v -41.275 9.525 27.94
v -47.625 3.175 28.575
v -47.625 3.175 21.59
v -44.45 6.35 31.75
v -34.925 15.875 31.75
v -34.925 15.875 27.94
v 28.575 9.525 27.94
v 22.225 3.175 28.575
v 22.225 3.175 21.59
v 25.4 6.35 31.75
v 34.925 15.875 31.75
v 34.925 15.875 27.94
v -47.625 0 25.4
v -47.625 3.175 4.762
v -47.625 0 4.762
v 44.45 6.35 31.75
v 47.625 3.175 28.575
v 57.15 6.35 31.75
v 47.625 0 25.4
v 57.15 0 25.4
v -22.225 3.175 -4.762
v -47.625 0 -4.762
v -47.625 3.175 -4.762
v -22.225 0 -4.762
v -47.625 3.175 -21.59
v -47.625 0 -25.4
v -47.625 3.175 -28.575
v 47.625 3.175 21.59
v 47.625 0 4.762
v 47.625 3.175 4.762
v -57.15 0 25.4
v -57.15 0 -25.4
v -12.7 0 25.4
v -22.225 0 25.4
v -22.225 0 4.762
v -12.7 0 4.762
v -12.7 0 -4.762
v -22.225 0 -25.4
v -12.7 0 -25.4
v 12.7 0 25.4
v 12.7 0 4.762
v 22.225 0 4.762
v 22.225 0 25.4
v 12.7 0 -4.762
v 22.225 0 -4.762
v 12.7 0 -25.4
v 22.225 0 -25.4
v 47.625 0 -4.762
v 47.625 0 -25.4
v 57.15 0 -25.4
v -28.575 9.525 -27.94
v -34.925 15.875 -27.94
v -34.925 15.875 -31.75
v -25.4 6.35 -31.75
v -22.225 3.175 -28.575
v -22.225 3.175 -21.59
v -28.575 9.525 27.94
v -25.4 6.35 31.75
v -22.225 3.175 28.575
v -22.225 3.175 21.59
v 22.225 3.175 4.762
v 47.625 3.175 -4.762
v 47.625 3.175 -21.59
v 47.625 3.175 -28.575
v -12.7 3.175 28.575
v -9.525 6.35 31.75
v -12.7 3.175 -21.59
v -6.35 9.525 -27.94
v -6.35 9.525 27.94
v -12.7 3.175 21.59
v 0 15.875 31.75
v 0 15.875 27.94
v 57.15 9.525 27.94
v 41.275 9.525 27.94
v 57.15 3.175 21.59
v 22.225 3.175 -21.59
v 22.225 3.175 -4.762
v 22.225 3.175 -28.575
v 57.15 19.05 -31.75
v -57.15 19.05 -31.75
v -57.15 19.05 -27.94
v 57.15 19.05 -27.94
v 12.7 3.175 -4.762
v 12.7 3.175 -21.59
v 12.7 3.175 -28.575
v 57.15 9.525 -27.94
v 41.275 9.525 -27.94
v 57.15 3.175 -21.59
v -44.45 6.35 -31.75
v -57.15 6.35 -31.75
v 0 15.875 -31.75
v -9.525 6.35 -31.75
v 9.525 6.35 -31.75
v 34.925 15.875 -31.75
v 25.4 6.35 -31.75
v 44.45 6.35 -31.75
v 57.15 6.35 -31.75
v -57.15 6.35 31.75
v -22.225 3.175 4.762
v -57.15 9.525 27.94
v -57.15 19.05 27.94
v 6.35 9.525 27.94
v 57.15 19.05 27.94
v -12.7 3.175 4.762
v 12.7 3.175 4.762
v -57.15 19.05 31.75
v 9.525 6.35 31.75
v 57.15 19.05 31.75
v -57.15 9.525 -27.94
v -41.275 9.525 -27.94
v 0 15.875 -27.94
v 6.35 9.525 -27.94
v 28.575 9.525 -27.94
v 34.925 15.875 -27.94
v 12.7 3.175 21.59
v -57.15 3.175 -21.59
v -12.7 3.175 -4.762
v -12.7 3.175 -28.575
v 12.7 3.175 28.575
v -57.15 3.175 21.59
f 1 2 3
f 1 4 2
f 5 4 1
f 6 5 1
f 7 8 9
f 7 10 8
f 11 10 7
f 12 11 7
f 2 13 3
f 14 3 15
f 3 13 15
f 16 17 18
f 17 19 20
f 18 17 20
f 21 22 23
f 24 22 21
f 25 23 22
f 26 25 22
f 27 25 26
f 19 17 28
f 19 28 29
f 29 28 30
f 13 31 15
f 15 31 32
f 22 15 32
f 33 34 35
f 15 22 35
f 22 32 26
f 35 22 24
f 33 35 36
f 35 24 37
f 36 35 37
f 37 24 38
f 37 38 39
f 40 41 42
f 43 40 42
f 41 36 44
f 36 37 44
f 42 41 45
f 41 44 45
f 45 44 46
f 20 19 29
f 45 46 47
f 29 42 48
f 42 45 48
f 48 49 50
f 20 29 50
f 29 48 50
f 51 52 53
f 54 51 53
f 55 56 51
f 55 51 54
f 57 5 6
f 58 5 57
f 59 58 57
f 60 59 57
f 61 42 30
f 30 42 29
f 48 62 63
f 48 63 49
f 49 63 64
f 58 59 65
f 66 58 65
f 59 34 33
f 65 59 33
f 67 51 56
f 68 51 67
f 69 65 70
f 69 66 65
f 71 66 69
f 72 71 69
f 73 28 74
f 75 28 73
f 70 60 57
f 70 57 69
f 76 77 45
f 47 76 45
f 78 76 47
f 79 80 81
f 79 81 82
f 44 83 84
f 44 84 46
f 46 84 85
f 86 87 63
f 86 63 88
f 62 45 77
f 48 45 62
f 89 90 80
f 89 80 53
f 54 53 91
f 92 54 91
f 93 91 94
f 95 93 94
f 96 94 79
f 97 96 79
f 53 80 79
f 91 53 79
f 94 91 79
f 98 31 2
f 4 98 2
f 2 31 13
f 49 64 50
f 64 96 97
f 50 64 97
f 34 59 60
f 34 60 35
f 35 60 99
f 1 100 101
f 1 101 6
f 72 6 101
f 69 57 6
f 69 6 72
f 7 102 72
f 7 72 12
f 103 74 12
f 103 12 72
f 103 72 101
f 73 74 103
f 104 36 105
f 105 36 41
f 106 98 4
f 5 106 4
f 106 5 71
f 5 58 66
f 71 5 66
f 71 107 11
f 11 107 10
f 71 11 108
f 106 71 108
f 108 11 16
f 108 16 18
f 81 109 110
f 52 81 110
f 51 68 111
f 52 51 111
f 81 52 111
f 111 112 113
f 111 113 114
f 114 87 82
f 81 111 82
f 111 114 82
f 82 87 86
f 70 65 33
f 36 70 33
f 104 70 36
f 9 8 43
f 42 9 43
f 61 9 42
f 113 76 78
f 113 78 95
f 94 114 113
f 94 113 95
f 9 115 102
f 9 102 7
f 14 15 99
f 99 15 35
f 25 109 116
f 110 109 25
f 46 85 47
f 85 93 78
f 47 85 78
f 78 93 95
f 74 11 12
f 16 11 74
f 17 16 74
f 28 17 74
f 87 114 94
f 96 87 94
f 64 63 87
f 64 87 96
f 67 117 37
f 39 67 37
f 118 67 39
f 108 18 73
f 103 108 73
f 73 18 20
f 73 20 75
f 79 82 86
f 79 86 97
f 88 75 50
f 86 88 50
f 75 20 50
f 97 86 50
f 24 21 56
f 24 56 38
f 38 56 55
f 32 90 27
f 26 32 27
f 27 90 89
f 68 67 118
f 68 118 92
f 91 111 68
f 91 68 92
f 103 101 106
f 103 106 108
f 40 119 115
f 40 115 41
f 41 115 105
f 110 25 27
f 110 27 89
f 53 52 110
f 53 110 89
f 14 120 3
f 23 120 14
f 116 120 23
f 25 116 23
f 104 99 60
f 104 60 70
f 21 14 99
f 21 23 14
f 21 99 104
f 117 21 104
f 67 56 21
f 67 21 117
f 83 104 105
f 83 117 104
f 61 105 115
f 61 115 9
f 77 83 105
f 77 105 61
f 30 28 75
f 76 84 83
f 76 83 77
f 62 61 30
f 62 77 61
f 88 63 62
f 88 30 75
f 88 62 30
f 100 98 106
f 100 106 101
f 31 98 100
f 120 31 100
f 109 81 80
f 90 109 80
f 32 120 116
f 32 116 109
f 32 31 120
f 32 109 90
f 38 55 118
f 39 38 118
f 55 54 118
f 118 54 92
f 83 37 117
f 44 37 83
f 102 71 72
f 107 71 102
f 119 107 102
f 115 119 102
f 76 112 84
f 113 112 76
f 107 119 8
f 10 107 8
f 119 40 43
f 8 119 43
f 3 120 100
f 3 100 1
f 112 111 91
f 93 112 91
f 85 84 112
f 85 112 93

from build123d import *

# Parameters (mm, degrees)
SKETCH1_W           = 114.3
SKETCH1_H           = 9.525
BOSS_EXTRUDE1_DEPTH = 3.175
SKETCH2_W           = 9.525
SKETCH2_H           = 63.5
BOSS_EXTRUDE2_DEPTH = 3.175
SKETCH3_W           = 9.525
SKETCH3_H           = 3.81
BOSS_EXTRUDE3_DEPTH = 12.7
SKETCH4_W           = 114.3
SKETCH4_H           = 3.81
BOSS_EXTRUDE4_DEPTH = 3.175
CHAMFER1_SIZE       = 12.7
CHAMFER2_SIZE       = 6.35


with BuildPart() as part:
    # Sketch1 → Boss-Extrude1 (new body)
    with BuildSketch(Plane(origin=(0, 0, 0), x_dir=(1, 0, 0), z_dir=(0, 1, 0))):
        Rectangle(SKETCH1_W, SKETCH1_H)
    extrude(amount=BOSS_EXTRUDE1_DEPTH)

    # Sketch2 → Boss-Extrude2 (add)
    with BuildSketch(Plane(origin=(0, 3.175, 0), x_dir=(1, 0, 0), z_dir=(0, 1, 0))):
        with Locations((-52.3875, 0)):
            Rectangle(SKETCH2_W, SKETCH2_H)
        with Locations((52.3875, 0)):
            Rectangle(SKETCH2_W, SKETCH2_H)
        with Locations((17.4625, 0)):
            Rectangle(SKETCH2_W, SKETCH2_H)
        with Locations((-17.4625, 0)):
            Rectangle(SKETCH2_W, SKETCH2_H)
    extrude(amount=-BOSS_EXTRUDE2_DEPTH)

    # Sketch3 → Boss-Extrude3 (add)
    with BuildSketch(Plane(origin=(0, 3.175, 0), x_dir=(1, 0, 0), z_dir=(0, 1, 0))):
        with Locations((-52.3875, -29.845)):
            Rectangle(SKETCH3_W, SKETCH3_H)
        with Locations((-17.4625, -29.845)):
            Rectangle(SKETCH3_W, SKETCH3_H)
        with Locations((17.4625, -29.845)):
            Rectangle(SKETCH3_W, SKETCH3_H)
        with Locations((52.3875, -29.845)):
            Rectangle(SKETCH3_W, SKETCH3_H)
        with Locations((52.3875, 29.845)):
            Rectangle(SKETCH3_W, SKETCH3_H)
        with Locations((17.4625, 29.845)):
            Rectangle(SKETCH3_W, SKETCH3_H)
        with Locations((-17.4625, 29.845)):
            Rectangle(SKETCH3_W, SKETCH3_H)
        with Locations((-52.3875, 29.845)):
            Rectangle(SKETCH3_W, SKETCH3_H)
    extrude(amount=BOSS_EXTRUDE3_DEPTH)

    # Sketch4 → Boss-Extrude4 (add)
    with BuildSketch(Plane(origin=(0, 15.875, 0), x_dir=(1, 0, 0), z_dir=(0, 1, 0))):
        with Locations((0, -29.845)):
            Rectangle(SKETCH4_W, SKETCH4_H)
        with Locations((0, 29.845)):
            Rectangle(SKETCH4_W, SKETCH4_H)
    extrude(amount=BOSS_EXTRUDE4_DEPTH)

    # Chamfer1
    chamfer1_edges = [part.edges().sort_by_distance(p)[0] for p in [
        (47.625, 15.875, -29.845),
        (22.225, 15.875, -29.845),
        (12.7, 15.875, -29.845),
        (-12.7, 15.875, -29.845),
        (-22.225, 15.875, -29.845),
        (-47.625, 15.875, -29.845),
        (47.625, 15.875, 29.845),
        (22.225, 15.875, 29.845),
        (12.7, 15.875, 29.845),
        (-12.7, 15.875, 29.845),
        (-22.225, 15.875, 29.845),
        (-47.625, 15.875, 29.845),
    ]]
    chamfer(chamfer1_edges, length=CHAMFER1_SIZE - 0.0001)  # a hair under: the kernel refuses the full size

    # Chamfer2
    chamfer2_edges = [part.edges().sort_by_distance(p)[0] for p in [
        (-52.3875, 3.175, -27.94),
        (-17.4625, 3.175, -27.94),
        (17.4625, 3.175, -27.94),
        (52.3875, 3.175, -27.94),
        (52.3875, 3.175, 27.94),
        (17.4625, 3.175, 27.94),
        (-17.4625, 3.175, 27.94),
        (-52.3875, 3.175, 27.94),
    ]]
    chamfer(chamfer2_edges, length=CHAMFER2_SIZE)
    chamfer2_2_edges = [part.edges().sort_by_distance(p)[0] for p in [
        (-52.3875, 0, -31.75),
        (-17.4625, 0, -31.75),
        (17.4625, 0, -31.75),
        (52.3875, 0, -31.75),
        (52.3875, 0, 31.75),
        (17.4625, 0, 31.75),
        (-17.4625, 0, 31.75),
        (-52.3875, 0, 31.75),
    ]]
    chamfer(chamfer2_2_edges, length=CHAMFER2_SIZE)


solid = part.part
